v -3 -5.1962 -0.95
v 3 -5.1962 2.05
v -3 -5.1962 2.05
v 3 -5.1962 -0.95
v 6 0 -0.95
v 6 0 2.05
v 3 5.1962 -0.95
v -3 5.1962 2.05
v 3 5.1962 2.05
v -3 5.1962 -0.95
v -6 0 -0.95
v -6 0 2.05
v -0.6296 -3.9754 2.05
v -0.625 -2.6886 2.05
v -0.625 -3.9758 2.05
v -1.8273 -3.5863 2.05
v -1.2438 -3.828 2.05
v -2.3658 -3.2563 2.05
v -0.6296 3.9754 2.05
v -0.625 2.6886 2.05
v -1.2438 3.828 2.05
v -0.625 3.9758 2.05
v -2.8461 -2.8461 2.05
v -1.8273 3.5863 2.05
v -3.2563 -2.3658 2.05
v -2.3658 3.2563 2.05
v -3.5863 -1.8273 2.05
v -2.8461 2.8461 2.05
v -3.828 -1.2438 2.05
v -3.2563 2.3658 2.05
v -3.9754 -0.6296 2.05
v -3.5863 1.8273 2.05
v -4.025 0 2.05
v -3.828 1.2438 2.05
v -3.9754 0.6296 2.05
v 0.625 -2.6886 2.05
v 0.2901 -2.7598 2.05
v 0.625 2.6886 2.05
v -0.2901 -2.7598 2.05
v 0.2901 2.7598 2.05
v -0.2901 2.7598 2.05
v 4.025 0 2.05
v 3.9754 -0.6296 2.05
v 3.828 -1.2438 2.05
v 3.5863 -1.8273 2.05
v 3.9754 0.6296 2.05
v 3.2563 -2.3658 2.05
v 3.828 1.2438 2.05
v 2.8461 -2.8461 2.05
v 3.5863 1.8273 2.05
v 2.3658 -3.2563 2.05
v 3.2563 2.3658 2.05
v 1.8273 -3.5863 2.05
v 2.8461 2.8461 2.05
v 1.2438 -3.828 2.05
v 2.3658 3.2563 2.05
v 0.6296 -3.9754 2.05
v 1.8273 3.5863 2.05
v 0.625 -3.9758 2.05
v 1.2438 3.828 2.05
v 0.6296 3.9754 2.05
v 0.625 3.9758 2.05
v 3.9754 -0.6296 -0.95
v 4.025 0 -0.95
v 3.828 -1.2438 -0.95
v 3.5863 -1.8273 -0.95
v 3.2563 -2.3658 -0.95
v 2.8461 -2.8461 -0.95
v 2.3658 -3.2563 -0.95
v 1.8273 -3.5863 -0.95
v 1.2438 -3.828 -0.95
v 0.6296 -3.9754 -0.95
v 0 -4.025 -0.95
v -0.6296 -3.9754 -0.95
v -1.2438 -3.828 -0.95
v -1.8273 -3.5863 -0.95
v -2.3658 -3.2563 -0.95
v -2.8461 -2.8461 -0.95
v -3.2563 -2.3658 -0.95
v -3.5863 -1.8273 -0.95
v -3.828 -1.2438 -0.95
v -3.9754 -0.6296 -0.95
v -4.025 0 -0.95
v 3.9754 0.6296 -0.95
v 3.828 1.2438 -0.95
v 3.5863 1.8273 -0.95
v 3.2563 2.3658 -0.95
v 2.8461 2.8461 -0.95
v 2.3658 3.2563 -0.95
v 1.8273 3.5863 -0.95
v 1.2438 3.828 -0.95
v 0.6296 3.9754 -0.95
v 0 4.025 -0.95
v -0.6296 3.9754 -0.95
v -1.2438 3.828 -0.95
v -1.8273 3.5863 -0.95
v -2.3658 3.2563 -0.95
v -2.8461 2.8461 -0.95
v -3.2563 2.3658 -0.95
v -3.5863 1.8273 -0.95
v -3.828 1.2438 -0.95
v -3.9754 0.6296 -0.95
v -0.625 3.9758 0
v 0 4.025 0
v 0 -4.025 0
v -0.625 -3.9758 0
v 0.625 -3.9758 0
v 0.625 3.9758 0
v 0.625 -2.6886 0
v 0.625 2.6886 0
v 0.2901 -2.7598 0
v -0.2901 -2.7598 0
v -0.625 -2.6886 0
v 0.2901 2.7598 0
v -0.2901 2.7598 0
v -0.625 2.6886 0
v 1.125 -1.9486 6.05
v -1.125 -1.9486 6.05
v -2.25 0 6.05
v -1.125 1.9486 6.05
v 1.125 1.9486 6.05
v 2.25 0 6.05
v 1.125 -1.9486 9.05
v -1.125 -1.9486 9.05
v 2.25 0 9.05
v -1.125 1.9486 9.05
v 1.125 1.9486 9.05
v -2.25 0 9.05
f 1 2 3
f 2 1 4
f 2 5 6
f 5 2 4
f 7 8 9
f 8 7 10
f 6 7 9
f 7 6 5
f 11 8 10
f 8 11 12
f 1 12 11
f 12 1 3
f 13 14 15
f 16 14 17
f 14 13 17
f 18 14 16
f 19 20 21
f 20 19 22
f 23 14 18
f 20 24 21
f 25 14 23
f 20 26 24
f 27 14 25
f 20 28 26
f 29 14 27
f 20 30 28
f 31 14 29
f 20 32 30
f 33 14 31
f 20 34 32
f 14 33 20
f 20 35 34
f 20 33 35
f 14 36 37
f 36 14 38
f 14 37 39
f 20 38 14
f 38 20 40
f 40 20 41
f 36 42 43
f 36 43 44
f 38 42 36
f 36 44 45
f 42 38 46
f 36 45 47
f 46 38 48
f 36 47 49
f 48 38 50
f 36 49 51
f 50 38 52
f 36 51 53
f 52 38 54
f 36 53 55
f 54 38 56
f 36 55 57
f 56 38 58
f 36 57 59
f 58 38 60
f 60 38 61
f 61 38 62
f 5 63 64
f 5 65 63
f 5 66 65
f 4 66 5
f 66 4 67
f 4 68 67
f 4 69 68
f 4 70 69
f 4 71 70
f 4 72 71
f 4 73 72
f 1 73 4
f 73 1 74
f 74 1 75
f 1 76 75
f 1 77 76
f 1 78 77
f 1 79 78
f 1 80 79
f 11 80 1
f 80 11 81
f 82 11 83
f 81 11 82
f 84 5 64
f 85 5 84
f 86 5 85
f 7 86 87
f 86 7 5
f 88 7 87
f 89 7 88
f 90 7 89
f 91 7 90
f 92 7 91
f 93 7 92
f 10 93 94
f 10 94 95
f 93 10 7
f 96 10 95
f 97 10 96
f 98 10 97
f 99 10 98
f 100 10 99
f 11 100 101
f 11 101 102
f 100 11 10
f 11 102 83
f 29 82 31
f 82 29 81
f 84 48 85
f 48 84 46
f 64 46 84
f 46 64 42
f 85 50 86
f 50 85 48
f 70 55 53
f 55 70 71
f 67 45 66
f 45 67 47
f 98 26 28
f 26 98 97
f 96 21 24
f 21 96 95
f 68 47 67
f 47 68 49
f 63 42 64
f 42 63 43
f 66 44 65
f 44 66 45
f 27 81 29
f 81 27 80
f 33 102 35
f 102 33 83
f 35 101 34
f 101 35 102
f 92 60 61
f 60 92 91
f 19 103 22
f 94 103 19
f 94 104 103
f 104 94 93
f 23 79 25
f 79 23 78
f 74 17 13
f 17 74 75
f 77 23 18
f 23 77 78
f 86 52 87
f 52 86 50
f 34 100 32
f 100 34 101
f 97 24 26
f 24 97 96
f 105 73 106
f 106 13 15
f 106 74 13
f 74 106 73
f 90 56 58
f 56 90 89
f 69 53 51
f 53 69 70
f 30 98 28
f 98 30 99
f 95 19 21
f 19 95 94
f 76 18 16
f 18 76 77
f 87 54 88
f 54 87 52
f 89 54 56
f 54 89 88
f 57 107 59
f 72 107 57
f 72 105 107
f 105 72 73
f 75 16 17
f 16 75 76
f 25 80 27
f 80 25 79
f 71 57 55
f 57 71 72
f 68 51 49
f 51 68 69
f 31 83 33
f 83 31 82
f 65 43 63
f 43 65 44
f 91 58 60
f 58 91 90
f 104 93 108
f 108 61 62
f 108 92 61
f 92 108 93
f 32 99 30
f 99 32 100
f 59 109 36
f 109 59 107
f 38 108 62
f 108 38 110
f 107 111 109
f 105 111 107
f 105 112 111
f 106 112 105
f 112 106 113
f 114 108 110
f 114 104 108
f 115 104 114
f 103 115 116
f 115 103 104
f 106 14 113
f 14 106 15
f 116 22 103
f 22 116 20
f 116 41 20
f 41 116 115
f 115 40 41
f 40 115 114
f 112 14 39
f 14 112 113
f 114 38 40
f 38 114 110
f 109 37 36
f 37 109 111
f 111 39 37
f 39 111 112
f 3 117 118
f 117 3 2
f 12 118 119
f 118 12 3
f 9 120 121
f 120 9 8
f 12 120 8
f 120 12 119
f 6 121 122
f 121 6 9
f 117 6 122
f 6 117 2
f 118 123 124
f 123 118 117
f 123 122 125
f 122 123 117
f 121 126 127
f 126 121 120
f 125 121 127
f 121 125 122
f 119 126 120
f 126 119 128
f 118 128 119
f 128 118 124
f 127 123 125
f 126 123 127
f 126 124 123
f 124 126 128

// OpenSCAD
d=7.75; //measured
doffset=0.3;
outer=12;

flathead=1.25;
foffset=0.0;
fheight=3;
fbase=0;

nheight=0.95;
nwidth=1.25;
htransfer=4;
dgrip=4.5;
dgrip_offset=0.3;
hgrip=3;

union() { 
    
    // cylinder cutout of outer hexagon  
    difference() {
      translate([0,0,-nheight]) cylinder(r=outer/2,h=fheight+fbase,$fn=6);
      translate([0,0,-nheight]) cylinder(r=((d+doffset)/2),h=fheight+nheight,$fn=40);
      //cube(50,50,50);
    }
    
    //nubs
    difference() {
      rectangle();
      cylinder(r=((d+doffset)/2)-nwidth,h=fheight,$fn=30);
    }
    
    
    // transfer + grip
    translate([0,0,-nheight+fheight+fbase]) cylinder(r1=outer/2,r2=dgrip/2,h=htransfer,$fn=6);
    translate([0,0,-nheight+fheight+fbase+htransfer]) cylinder(r=dgrip/2,h=hgrip,$fn=6);
};

module rectangle() {
    w=flathead-foffset;
    l=outer-2;
    h=fheight-nheight;
    translate([0,0,h/2]) cube([w,l,h], center=true);
}
